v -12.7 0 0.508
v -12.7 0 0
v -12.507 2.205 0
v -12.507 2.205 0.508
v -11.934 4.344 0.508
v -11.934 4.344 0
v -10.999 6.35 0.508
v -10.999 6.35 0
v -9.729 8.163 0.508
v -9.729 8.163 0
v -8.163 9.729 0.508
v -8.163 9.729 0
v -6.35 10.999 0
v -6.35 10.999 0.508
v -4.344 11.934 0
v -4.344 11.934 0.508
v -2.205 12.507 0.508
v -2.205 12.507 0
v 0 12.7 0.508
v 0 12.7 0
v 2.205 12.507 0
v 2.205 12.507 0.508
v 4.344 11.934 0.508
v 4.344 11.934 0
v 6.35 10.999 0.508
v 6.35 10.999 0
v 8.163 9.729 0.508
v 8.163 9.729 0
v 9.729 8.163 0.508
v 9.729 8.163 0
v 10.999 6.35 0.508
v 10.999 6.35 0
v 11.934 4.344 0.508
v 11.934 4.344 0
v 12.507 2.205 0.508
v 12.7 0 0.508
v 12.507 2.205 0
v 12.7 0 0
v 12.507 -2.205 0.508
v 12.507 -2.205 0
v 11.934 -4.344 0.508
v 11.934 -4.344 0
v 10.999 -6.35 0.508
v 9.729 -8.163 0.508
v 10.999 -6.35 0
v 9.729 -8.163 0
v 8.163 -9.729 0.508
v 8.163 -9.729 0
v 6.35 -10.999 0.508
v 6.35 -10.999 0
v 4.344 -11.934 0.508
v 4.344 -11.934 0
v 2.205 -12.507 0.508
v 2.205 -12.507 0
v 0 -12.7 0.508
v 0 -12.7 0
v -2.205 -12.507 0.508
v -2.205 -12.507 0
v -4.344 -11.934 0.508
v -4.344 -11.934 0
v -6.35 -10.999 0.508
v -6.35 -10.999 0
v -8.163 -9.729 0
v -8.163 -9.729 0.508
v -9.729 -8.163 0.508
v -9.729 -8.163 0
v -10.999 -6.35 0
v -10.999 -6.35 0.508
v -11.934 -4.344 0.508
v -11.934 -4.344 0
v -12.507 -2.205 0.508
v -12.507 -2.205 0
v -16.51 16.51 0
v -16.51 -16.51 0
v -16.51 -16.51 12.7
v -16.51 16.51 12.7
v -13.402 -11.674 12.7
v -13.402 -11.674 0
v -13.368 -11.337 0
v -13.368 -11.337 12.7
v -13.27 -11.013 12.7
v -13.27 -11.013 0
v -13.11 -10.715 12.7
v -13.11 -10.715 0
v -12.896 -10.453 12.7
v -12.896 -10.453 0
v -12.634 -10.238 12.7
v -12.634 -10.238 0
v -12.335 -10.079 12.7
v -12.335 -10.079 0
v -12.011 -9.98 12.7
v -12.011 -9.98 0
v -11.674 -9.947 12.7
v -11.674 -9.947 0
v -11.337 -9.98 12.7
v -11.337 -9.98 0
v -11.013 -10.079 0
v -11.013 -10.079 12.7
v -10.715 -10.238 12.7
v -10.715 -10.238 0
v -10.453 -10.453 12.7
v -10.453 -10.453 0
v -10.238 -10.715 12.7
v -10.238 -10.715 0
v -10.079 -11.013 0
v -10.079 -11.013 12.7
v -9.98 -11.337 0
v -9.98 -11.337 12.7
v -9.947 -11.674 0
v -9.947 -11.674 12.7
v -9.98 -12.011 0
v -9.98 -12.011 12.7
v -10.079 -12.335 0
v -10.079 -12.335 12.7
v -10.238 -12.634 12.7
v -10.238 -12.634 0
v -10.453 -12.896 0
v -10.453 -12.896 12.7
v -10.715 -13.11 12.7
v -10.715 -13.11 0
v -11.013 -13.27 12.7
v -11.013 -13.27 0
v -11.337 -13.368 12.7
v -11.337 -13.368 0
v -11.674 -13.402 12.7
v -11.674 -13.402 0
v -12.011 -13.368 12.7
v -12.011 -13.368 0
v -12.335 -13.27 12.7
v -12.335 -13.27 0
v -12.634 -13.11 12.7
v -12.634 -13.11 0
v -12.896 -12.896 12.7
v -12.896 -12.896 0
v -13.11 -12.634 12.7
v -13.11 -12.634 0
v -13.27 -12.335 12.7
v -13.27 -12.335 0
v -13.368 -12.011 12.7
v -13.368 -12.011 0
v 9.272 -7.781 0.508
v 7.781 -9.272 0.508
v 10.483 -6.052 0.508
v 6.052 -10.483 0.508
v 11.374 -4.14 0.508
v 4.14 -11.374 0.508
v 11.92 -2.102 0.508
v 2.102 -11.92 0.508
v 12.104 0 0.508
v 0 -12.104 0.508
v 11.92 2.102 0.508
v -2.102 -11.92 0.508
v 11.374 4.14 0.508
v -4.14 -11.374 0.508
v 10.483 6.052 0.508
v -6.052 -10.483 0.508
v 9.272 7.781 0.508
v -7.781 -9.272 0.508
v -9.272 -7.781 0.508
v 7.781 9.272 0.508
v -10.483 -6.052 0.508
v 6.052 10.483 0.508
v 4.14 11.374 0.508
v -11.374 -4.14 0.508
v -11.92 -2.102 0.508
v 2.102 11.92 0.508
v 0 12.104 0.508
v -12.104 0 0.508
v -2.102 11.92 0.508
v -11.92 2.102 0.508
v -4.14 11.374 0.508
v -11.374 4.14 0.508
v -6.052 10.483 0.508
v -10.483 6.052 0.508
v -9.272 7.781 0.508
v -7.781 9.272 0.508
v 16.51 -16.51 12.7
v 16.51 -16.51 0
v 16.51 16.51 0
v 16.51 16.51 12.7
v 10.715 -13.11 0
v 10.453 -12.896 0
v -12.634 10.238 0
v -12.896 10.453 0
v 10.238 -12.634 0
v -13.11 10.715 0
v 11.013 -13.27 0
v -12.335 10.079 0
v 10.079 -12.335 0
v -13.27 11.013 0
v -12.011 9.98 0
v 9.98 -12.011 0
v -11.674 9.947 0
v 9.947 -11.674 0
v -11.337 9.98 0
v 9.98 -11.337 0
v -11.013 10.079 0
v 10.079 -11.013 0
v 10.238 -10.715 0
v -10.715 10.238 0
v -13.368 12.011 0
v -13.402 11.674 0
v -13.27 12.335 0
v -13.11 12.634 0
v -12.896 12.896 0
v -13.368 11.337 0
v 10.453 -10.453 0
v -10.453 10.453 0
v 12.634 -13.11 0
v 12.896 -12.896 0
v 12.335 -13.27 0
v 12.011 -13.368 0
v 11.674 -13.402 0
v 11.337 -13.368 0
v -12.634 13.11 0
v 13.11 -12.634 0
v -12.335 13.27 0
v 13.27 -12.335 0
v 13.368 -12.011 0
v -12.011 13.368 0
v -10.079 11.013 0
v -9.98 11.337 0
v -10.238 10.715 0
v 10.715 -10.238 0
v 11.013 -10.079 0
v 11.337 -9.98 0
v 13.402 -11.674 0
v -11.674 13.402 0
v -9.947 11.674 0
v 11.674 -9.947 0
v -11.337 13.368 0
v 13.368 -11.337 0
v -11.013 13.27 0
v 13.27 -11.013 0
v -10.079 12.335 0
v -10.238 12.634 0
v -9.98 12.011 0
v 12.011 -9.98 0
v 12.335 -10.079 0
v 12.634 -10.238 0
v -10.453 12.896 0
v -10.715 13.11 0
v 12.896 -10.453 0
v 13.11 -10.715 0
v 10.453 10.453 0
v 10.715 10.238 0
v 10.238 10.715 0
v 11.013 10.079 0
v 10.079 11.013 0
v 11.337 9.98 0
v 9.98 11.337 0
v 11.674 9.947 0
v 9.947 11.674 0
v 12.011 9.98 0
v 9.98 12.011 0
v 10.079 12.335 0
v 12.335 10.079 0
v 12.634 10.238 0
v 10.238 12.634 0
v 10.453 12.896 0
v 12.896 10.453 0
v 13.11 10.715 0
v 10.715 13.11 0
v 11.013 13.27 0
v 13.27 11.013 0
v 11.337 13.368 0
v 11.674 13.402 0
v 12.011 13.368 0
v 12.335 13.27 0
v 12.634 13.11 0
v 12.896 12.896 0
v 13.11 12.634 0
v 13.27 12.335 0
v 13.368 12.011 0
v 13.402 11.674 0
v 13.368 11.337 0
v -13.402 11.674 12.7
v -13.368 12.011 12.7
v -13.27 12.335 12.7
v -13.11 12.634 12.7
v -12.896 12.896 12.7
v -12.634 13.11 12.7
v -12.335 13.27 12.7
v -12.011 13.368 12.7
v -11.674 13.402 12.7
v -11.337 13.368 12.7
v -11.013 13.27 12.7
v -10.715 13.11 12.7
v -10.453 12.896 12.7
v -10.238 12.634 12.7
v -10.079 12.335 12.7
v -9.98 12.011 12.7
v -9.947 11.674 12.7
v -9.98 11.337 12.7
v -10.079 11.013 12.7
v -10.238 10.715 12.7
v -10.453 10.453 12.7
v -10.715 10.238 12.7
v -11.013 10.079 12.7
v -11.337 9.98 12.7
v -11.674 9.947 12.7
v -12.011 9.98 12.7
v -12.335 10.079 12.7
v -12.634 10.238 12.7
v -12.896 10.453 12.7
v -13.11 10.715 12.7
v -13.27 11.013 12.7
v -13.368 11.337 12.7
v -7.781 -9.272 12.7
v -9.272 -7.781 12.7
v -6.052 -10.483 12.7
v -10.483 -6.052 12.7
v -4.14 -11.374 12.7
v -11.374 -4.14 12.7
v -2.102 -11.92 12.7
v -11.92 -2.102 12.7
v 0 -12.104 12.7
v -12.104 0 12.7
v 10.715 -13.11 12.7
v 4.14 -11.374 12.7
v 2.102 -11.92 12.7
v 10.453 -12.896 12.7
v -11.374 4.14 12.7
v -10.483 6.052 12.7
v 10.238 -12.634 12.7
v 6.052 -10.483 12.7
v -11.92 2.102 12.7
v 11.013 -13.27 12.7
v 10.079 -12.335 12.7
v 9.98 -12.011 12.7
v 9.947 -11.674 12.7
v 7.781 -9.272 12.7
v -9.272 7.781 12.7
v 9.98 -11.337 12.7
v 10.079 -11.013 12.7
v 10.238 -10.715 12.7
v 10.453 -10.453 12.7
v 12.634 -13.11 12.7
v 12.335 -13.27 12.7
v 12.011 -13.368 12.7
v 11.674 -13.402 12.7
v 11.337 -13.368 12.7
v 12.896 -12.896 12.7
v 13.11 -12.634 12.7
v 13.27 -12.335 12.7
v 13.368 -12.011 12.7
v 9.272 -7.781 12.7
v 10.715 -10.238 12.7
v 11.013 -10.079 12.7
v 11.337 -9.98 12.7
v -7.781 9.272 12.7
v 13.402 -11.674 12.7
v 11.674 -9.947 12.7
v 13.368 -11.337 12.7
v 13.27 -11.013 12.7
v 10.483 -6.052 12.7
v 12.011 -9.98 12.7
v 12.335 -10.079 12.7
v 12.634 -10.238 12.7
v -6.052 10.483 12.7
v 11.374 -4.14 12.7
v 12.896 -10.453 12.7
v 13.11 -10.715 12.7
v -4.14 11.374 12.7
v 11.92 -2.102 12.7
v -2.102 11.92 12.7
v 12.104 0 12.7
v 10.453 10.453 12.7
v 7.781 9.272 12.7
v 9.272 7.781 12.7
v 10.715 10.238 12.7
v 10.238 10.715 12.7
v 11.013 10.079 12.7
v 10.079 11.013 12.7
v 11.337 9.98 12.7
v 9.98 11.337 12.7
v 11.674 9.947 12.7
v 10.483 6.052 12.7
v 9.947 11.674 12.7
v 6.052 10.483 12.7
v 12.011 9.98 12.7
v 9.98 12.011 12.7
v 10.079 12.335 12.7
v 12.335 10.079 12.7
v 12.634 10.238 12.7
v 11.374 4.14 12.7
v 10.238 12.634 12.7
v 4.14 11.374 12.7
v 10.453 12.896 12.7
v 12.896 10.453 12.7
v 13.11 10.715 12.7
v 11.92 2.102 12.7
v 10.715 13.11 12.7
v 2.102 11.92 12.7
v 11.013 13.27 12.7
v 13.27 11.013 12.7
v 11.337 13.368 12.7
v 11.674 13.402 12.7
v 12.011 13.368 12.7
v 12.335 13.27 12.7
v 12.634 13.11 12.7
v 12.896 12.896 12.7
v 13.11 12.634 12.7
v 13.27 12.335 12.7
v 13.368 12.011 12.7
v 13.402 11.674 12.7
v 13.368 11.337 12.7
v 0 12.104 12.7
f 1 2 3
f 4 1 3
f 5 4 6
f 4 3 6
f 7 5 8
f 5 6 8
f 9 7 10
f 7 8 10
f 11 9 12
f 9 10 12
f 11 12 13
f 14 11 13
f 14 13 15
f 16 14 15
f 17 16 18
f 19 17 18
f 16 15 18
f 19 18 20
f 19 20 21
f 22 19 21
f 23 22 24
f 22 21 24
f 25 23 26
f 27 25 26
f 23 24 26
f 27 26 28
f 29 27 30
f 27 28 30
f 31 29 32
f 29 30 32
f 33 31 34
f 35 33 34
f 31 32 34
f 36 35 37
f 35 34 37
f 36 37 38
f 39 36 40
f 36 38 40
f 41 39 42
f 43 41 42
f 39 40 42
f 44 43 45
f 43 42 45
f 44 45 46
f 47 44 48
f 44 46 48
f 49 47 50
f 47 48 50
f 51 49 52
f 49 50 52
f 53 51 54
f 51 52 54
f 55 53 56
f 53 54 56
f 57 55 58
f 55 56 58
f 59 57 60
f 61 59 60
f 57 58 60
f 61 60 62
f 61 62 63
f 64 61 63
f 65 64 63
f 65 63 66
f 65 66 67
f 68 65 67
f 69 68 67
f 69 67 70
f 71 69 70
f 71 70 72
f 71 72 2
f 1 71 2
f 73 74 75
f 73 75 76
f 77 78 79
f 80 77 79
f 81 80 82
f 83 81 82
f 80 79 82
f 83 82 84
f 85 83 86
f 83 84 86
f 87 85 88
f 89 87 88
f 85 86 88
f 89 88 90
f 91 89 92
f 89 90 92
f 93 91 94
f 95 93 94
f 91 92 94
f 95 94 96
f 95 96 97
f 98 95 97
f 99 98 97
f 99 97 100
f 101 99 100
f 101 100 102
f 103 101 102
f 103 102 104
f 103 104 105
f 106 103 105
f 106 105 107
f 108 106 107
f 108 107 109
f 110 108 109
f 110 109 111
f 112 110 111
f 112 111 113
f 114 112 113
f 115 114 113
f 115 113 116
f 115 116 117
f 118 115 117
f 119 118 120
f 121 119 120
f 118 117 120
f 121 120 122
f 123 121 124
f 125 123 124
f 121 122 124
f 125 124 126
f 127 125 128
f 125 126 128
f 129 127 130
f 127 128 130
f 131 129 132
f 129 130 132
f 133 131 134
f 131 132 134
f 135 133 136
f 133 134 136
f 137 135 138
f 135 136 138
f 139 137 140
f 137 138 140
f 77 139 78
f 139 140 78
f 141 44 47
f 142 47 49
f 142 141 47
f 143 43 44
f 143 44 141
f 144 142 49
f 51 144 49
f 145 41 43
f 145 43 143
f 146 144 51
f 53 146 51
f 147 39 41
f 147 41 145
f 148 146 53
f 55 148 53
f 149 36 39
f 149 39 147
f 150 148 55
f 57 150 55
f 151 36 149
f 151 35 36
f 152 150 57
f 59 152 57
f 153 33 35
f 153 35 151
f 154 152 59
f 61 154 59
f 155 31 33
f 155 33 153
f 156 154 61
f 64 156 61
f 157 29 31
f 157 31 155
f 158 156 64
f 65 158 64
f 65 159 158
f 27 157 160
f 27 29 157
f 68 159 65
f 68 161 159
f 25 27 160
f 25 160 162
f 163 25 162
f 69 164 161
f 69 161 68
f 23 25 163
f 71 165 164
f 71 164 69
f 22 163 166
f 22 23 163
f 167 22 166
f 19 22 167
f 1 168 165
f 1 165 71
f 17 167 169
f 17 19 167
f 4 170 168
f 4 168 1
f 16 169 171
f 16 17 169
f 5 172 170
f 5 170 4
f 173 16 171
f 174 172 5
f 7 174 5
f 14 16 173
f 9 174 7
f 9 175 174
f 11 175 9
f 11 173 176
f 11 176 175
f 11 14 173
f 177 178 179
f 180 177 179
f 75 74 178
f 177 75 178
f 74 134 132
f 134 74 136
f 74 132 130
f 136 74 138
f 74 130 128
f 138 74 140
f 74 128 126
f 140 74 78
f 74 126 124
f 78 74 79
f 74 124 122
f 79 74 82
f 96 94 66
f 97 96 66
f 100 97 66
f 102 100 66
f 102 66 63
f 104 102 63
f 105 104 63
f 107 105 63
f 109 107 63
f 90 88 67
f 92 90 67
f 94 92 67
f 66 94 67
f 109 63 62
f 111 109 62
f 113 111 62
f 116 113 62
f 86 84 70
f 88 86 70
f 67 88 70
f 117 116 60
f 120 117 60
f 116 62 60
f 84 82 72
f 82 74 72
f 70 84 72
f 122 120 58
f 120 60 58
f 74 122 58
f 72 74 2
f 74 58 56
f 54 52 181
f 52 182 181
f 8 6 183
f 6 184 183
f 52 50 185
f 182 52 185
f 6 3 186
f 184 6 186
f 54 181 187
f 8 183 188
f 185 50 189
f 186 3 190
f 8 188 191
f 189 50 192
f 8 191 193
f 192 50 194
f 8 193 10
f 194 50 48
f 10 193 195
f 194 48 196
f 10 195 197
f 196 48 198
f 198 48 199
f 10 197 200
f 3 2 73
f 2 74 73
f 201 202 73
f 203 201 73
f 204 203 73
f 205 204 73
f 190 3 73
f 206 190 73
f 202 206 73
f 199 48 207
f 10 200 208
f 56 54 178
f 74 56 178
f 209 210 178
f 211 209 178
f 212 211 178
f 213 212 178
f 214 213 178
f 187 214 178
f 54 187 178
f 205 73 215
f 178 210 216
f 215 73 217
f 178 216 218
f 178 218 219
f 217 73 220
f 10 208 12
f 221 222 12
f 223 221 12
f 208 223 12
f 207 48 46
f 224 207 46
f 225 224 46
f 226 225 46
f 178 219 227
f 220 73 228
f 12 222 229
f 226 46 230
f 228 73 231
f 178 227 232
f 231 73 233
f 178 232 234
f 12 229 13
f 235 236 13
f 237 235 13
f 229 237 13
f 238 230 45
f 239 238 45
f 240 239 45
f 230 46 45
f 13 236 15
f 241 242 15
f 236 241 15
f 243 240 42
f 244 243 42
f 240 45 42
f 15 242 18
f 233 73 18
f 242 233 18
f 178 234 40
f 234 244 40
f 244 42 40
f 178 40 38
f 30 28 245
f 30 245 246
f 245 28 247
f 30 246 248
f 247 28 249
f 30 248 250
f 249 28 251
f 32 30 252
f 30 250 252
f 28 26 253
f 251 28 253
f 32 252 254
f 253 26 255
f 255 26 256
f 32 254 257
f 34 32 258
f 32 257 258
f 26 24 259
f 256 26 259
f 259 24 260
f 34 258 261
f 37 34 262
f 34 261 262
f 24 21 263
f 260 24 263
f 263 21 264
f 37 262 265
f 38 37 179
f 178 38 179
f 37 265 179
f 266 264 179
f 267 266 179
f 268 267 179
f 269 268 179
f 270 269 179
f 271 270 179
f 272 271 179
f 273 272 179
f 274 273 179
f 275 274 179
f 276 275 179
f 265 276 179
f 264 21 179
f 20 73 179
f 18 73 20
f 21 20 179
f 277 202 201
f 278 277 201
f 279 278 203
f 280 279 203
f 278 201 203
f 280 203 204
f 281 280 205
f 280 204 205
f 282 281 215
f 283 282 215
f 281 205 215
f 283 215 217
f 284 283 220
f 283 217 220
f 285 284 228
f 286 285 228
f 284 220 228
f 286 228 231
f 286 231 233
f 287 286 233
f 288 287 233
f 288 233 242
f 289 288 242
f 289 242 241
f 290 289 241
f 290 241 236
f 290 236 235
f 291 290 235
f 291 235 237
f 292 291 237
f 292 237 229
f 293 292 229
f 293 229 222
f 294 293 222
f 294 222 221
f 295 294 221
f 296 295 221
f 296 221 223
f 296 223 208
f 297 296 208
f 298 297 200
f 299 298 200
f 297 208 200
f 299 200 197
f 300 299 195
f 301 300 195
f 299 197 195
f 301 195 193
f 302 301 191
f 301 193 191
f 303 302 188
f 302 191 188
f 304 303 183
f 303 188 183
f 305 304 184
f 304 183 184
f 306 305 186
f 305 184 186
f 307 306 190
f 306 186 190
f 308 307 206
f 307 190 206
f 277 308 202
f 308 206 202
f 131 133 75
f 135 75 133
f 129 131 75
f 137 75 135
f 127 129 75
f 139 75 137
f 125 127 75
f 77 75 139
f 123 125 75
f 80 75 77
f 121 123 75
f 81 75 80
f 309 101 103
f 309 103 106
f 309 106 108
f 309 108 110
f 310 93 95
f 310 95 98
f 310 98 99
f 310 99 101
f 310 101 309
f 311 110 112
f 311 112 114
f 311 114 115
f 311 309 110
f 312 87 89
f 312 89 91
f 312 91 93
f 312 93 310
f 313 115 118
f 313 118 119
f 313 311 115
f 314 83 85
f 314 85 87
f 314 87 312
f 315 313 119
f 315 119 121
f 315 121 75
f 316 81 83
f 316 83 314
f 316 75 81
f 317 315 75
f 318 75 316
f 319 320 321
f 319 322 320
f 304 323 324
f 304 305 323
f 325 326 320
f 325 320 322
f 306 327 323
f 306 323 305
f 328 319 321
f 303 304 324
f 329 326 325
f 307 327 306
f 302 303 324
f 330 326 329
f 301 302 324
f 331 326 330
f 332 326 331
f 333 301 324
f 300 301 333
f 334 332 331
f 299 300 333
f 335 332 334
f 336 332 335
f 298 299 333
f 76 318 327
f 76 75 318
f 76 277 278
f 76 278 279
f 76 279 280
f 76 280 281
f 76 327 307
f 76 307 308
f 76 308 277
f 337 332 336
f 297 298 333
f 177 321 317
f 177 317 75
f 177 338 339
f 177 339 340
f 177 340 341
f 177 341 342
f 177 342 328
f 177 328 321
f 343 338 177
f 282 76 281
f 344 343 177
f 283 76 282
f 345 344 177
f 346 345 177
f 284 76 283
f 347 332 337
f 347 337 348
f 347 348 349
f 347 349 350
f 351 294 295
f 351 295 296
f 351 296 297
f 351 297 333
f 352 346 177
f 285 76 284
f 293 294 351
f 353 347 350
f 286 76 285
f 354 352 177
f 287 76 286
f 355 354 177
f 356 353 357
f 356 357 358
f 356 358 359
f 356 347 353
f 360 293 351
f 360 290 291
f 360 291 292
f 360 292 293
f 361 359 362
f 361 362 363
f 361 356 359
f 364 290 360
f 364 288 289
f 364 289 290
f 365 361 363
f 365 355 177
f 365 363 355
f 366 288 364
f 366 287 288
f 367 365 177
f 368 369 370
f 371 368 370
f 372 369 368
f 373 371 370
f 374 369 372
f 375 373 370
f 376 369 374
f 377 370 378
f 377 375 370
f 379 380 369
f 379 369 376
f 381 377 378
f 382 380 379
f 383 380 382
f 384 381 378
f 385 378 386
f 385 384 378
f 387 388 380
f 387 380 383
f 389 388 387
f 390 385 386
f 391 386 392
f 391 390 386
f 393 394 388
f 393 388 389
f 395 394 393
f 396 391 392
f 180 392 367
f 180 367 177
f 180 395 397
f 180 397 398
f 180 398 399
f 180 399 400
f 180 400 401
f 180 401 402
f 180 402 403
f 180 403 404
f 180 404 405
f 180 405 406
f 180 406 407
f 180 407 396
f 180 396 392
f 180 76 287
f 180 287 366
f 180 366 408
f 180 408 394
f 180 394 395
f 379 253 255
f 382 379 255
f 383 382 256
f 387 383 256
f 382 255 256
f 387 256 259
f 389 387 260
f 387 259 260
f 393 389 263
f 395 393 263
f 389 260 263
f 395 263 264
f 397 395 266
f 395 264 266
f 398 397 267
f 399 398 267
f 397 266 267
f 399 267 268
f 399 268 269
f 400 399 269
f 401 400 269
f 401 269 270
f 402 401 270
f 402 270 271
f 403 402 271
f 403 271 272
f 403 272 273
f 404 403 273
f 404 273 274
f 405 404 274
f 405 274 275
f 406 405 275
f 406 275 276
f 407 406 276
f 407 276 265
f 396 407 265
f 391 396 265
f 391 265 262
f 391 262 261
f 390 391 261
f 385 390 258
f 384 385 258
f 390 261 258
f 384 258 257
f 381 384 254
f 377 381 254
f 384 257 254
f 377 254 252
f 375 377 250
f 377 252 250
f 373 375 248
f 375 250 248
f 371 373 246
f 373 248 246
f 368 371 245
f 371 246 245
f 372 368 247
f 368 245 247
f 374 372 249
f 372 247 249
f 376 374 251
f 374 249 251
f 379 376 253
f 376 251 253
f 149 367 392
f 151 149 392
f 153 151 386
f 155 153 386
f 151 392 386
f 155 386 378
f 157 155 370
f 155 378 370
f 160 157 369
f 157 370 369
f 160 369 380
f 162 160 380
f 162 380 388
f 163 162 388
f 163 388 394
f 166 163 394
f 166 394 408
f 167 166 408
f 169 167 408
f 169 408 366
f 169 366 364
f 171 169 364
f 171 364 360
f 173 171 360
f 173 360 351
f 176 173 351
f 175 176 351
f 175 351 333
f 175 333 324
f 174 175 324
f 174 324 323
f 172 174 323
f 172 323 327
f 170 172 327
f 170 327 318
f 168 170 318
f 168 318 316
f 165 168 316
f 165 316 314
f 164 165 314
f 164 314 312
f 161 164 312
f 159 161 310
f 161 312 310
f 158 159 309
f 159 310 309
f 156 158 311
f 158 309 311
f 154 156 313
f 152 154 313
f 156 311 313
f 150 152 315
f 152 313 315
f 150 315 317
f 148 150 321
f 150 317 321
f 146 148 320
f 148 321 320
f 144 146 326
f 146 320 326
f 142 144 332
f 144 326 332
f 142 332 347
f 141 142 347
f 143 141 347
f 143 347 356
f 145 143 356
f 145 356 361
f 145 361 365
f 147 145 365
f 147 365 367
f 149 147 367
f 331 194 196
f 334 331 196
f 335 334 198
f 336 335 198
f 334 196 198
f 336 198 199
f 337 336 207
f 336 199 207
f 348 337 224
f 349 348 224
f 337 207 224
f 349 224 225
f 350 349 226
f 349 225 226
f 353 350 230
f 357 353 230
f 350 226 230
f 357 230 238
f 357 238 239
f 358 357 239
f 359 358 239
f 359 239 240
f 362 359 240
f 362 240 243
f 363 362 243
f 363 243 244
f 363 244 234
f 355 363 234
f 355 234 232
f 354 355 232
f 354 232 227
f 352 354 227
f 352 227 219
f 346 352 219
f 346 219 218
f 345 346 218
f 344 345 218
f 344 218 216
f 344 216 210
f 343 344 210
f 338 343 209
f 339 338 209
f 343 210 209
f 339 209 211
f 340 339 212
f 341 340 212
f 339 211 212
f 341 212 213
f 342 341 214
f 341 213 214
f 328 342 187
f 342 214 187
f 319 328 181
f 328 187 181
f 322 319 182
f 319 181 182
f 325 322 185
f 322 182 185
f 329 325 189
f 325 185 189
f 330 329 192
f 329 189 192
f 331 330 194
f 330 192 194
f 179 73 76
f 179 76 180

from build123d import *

# Parameters (mm, degrees)
SKETCH2_W             = 33.02
SKETCH2_H             = 33.02
BOSS_EXTRUDE1_DEPTH   = 12.7
SKETCH3_R             = 12.10437
CUT_EXTRUDE1_DEPTH    = 27.579130911
F_8_32_TAPPED_HOLE1_D = 3.4544
SKETCH9_R             = 12.7
CUT_EXTRUDE2_DEPTH    = 0.508


with BuildPart() as part:
    # Sketch2 → Boss-Extrude1 (new body)
    with BuildSketch(Plane.XY):
        Rectangle(SKETCH2_W, SKETCH2_H)
    extrude(amount=BOSS_EXTRUDE1_DEPTH)

    # Sketch3 → Cut-Extrude1 (cut, through all)
    with BuildSketch(Plane.XY.offset(12.7)):
        Circle(SKETCH3_R)
    extrude(amount=-CUT_EXTRUDE1_DEPTH, mode=Mode.SUBTRACT)

    # #8-32 Tapped Hole1 (through all)
    with Locations(Plane.XY.offset(12.7)):
        with Locations((-11.674332957, 11.674332957), (11.674332957, 11.674332957), (11.674332957, -11.674332957), (-11.674332957, -11.674332957)):
            Hole(F_8_32_TAPPED_HOLE1_D / 2)

    # Sketch9 → Cut-Extrude2 (cut)
    with BuildSketch(Plane(origin=(0, 0, 0), x_dir=(-1, 0, 0), z_dir=(0, 0, -1))):
        Circle(SKETCH9_R)
    extrude(amount=-CUT_EXTRUDE2_DEPTH, mode=Mode.SUBTRACT)


solid = part.part
